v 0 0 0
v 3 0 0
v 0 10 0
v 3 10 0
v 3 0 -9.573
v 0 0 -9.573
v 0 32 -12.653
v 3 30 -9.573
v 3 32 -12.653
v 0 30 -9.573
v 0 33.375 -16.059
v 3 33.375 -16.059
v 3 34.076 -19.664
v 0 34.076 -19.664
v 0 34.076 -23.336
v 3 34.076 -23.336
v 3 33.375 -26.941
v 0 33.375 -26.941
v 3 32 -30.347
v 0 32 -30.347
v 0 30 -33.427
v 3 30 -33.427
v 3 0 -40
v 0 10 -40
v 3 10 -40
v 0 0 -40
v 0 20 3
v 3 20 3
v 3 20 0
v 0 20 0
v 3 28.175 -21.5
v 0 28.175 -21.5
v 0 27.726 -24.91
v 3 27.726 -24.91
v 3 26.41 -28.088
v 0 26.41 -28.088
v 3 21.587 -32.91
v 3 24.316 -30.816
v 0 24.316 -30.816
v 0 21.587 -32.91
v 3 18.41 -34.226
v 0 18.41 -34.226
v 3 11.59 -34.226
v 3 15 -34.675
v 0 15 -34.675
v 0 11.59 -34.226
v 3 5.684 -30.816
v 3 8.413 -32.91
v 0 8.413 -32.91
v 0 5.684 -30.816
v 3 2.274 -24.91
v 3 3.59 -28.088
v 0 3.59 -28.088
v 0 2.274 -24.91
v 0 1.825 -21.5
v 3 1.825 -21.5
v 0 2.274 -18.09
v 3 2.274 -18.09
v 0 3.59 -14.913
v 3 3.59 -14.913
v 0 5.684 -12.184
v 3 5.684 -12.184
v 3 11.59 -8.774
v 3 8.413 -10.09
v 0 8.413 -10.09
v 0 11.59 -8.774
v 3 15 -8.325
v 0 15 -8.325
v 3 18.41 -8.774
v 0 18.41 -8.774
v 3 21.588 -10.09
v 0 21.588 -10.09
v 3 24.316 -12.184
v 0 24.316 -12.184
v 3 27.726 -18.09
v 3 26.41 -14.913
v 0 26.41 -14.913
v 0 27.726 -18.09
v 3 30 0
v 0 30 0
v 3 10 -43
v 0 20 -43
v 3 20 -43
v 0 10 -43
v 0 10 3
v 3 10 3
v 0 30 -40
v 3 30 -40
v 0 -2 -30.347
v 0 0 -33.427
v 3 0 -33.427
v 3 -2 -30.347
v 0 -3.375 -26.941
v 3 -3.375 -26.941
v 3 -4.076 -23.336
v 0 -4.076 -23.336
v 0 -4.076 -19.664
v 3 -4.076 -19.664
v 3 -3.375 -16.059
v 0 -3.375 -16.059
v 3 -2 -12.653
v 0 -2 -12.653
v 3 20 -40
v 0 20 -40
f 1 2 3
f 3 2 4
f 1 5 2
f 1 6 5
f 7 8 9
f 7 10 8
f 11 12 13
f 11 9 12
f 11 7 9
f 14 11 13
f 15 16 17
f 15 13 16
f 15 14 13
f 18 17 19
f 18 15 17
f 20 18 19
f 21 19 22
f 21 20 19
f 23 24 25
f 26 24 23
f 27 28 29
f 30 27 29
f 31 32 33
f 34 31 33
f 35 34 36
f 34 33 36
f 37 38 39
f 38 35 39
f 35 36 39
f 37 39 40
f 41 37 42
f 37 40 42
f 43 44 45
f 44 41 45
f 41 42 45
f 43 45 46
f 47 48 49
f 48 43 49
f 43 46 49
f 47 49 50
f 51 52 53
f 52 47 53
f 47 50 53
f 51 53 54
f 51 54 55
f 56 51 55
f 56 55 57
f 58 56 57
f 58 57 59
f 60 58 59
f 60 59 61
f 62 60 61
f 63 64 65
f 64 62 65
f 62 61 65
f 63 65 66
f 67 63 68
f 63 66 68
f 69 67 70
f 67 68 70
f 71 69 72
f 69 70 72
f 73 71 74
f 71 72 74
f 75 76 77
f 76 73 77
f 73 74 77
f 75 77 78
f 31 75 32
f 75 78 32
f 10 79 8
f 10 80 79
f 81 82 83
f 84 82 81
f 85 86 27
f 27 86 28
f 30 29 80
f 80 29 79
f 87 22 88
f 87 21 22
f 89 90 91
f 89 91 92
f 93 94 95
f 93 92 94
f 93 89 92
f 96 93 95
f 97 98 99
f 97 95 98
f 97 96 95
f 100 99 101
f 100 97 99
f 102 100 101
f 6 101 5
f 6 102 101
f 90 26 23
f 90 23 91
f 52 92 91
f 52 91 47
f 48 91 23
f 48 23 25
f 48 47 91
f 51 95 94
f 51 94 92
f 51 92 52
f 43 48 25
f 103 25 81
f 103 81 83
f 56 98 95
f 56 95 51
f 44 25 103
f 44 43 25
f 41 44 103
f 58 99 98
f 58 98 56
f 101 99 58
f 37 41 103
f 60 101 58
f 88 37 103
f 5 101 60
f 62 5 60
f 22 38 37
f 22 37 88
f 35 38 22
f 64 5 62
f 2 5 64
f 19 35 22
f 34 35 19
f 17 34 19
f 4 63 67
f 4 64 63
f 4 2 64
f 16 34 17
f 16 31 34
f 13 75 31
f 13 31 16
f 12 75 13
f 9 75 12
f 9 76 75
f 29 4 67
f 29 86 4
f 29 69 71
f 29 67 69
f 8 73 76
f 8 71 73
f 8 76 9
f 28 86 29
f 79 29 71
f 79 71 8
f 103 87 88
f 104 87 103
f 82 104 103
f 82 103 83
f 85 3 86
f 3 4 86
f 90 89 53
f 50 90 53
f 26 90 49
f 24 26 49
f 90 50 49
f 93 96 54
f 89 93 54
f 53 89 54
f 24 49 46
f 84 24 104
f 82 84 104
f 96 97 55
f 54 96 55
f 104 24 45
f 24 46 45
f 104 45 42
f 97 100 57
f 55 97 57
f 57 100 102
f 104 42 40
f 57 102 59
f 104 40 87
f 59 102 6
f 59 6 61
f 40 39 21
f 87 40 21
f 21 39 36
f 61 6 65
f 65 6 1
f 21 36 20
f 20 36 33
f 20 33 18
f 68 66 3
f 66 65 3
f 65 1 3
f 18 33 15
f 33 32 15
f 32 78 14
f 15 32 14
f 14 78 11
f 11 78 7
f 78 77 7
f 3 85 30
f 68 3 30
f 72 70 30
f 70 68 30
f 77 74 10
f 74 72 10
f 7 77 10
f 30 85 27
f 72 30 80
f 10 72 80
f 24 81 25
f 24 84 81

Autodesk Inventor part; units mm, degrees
ref_plane "YZ Plane" through (0, 0, 0) normal (1, 0, 0) x (0, 1, 0)
ref_plane "XZ Plane" through (0, 0, 0) normal (0, 1, 0) x (-1, 0, 0)
ref_plane "XY Plane" through (0, 0, 0) normal (0, 0, 1) x (1, 0, 0)
sketch "Boceto1" plane through (0, 0, 0) normal (1, 0, 0) x (0, 1, 0)
  line L0 (0, 0) -> (0, -3)
  line L1 (0, -3) -> (10, -3)
  line L2 (10, -3) -> (10, 0)
  line L3 (10, 0) -> (20, 0)
  line L4 (20, 0) -> (20, -3)
  line L5 (20, -3) -> (30, -3)
  line L6 (30, -33.4269) -> (30, -40)
  line L7 (30, -40) -> (20, -40)
  line L8 (20, -40) -> (20, -43)
  line L9 (20, -43) -> (10, -43)
  line L10 (10, -43) -> (10, -40)
  line L11 (10, -40) -> (0, -40)
  circle A0 centre (15, -21.5) radius 13.175
  arc A1 (0, -9.5731) -> (0, -33.4269) centre (15, -21.5) ccw
  arc A2 (30, -33.4269) -> (30, -9.5731) centre (15, -21.5) ccw
  line L12 (0, -40) -> (0, -33.4269)
  line L13 (0, -9.5731) -> (0, -3)
  line L14 (30, -3) -> (30, -9.5731)
  dimension "d1" = 10
  dimension "d2" = 10
  dimension "d3" = 10
extrude "Extrusión1" add sketch "Boceto1" along normal blind 3
sketch "Boceto2" plane through (3, 0, 0) normal (1, 0, 0) x (0, 0, -1)
  line L0 (3, 10) -> (3, 0) projected
  line L1 (3, 0) -> (0, 0)
  line L2 (0, 20) -> (0, 10) projected
  line L3 (0, 0) -> (0, 10)
  line L4 (0, 10) -> (-3, 10)
  line L5 (-3, 10) -> (-3, 20)
  line L6 (-3, 20) -> (0, 20)
  line L7 (0, 20) -> (0, 30)
  line L8 (3, 30) -> (3, 20) projected
  line L9 (0, 30) -> (3, 30)
  line L10 (3, 30) -> (3, 20)
  line L11 (3, 20) -> (0, 20) projected
  line L12 (3, 20) -> (0, 20)
  line L13 (0, 20) -> (0, 10)
  line L14 (0, 10) -> (3, 10)
  line L15 (3, 0) -> (3, 10)
  dimension "d11" = 3
extrude "Extrusión2" add sketch "Boceto2" against normal blind 3
properties part number "cod"
